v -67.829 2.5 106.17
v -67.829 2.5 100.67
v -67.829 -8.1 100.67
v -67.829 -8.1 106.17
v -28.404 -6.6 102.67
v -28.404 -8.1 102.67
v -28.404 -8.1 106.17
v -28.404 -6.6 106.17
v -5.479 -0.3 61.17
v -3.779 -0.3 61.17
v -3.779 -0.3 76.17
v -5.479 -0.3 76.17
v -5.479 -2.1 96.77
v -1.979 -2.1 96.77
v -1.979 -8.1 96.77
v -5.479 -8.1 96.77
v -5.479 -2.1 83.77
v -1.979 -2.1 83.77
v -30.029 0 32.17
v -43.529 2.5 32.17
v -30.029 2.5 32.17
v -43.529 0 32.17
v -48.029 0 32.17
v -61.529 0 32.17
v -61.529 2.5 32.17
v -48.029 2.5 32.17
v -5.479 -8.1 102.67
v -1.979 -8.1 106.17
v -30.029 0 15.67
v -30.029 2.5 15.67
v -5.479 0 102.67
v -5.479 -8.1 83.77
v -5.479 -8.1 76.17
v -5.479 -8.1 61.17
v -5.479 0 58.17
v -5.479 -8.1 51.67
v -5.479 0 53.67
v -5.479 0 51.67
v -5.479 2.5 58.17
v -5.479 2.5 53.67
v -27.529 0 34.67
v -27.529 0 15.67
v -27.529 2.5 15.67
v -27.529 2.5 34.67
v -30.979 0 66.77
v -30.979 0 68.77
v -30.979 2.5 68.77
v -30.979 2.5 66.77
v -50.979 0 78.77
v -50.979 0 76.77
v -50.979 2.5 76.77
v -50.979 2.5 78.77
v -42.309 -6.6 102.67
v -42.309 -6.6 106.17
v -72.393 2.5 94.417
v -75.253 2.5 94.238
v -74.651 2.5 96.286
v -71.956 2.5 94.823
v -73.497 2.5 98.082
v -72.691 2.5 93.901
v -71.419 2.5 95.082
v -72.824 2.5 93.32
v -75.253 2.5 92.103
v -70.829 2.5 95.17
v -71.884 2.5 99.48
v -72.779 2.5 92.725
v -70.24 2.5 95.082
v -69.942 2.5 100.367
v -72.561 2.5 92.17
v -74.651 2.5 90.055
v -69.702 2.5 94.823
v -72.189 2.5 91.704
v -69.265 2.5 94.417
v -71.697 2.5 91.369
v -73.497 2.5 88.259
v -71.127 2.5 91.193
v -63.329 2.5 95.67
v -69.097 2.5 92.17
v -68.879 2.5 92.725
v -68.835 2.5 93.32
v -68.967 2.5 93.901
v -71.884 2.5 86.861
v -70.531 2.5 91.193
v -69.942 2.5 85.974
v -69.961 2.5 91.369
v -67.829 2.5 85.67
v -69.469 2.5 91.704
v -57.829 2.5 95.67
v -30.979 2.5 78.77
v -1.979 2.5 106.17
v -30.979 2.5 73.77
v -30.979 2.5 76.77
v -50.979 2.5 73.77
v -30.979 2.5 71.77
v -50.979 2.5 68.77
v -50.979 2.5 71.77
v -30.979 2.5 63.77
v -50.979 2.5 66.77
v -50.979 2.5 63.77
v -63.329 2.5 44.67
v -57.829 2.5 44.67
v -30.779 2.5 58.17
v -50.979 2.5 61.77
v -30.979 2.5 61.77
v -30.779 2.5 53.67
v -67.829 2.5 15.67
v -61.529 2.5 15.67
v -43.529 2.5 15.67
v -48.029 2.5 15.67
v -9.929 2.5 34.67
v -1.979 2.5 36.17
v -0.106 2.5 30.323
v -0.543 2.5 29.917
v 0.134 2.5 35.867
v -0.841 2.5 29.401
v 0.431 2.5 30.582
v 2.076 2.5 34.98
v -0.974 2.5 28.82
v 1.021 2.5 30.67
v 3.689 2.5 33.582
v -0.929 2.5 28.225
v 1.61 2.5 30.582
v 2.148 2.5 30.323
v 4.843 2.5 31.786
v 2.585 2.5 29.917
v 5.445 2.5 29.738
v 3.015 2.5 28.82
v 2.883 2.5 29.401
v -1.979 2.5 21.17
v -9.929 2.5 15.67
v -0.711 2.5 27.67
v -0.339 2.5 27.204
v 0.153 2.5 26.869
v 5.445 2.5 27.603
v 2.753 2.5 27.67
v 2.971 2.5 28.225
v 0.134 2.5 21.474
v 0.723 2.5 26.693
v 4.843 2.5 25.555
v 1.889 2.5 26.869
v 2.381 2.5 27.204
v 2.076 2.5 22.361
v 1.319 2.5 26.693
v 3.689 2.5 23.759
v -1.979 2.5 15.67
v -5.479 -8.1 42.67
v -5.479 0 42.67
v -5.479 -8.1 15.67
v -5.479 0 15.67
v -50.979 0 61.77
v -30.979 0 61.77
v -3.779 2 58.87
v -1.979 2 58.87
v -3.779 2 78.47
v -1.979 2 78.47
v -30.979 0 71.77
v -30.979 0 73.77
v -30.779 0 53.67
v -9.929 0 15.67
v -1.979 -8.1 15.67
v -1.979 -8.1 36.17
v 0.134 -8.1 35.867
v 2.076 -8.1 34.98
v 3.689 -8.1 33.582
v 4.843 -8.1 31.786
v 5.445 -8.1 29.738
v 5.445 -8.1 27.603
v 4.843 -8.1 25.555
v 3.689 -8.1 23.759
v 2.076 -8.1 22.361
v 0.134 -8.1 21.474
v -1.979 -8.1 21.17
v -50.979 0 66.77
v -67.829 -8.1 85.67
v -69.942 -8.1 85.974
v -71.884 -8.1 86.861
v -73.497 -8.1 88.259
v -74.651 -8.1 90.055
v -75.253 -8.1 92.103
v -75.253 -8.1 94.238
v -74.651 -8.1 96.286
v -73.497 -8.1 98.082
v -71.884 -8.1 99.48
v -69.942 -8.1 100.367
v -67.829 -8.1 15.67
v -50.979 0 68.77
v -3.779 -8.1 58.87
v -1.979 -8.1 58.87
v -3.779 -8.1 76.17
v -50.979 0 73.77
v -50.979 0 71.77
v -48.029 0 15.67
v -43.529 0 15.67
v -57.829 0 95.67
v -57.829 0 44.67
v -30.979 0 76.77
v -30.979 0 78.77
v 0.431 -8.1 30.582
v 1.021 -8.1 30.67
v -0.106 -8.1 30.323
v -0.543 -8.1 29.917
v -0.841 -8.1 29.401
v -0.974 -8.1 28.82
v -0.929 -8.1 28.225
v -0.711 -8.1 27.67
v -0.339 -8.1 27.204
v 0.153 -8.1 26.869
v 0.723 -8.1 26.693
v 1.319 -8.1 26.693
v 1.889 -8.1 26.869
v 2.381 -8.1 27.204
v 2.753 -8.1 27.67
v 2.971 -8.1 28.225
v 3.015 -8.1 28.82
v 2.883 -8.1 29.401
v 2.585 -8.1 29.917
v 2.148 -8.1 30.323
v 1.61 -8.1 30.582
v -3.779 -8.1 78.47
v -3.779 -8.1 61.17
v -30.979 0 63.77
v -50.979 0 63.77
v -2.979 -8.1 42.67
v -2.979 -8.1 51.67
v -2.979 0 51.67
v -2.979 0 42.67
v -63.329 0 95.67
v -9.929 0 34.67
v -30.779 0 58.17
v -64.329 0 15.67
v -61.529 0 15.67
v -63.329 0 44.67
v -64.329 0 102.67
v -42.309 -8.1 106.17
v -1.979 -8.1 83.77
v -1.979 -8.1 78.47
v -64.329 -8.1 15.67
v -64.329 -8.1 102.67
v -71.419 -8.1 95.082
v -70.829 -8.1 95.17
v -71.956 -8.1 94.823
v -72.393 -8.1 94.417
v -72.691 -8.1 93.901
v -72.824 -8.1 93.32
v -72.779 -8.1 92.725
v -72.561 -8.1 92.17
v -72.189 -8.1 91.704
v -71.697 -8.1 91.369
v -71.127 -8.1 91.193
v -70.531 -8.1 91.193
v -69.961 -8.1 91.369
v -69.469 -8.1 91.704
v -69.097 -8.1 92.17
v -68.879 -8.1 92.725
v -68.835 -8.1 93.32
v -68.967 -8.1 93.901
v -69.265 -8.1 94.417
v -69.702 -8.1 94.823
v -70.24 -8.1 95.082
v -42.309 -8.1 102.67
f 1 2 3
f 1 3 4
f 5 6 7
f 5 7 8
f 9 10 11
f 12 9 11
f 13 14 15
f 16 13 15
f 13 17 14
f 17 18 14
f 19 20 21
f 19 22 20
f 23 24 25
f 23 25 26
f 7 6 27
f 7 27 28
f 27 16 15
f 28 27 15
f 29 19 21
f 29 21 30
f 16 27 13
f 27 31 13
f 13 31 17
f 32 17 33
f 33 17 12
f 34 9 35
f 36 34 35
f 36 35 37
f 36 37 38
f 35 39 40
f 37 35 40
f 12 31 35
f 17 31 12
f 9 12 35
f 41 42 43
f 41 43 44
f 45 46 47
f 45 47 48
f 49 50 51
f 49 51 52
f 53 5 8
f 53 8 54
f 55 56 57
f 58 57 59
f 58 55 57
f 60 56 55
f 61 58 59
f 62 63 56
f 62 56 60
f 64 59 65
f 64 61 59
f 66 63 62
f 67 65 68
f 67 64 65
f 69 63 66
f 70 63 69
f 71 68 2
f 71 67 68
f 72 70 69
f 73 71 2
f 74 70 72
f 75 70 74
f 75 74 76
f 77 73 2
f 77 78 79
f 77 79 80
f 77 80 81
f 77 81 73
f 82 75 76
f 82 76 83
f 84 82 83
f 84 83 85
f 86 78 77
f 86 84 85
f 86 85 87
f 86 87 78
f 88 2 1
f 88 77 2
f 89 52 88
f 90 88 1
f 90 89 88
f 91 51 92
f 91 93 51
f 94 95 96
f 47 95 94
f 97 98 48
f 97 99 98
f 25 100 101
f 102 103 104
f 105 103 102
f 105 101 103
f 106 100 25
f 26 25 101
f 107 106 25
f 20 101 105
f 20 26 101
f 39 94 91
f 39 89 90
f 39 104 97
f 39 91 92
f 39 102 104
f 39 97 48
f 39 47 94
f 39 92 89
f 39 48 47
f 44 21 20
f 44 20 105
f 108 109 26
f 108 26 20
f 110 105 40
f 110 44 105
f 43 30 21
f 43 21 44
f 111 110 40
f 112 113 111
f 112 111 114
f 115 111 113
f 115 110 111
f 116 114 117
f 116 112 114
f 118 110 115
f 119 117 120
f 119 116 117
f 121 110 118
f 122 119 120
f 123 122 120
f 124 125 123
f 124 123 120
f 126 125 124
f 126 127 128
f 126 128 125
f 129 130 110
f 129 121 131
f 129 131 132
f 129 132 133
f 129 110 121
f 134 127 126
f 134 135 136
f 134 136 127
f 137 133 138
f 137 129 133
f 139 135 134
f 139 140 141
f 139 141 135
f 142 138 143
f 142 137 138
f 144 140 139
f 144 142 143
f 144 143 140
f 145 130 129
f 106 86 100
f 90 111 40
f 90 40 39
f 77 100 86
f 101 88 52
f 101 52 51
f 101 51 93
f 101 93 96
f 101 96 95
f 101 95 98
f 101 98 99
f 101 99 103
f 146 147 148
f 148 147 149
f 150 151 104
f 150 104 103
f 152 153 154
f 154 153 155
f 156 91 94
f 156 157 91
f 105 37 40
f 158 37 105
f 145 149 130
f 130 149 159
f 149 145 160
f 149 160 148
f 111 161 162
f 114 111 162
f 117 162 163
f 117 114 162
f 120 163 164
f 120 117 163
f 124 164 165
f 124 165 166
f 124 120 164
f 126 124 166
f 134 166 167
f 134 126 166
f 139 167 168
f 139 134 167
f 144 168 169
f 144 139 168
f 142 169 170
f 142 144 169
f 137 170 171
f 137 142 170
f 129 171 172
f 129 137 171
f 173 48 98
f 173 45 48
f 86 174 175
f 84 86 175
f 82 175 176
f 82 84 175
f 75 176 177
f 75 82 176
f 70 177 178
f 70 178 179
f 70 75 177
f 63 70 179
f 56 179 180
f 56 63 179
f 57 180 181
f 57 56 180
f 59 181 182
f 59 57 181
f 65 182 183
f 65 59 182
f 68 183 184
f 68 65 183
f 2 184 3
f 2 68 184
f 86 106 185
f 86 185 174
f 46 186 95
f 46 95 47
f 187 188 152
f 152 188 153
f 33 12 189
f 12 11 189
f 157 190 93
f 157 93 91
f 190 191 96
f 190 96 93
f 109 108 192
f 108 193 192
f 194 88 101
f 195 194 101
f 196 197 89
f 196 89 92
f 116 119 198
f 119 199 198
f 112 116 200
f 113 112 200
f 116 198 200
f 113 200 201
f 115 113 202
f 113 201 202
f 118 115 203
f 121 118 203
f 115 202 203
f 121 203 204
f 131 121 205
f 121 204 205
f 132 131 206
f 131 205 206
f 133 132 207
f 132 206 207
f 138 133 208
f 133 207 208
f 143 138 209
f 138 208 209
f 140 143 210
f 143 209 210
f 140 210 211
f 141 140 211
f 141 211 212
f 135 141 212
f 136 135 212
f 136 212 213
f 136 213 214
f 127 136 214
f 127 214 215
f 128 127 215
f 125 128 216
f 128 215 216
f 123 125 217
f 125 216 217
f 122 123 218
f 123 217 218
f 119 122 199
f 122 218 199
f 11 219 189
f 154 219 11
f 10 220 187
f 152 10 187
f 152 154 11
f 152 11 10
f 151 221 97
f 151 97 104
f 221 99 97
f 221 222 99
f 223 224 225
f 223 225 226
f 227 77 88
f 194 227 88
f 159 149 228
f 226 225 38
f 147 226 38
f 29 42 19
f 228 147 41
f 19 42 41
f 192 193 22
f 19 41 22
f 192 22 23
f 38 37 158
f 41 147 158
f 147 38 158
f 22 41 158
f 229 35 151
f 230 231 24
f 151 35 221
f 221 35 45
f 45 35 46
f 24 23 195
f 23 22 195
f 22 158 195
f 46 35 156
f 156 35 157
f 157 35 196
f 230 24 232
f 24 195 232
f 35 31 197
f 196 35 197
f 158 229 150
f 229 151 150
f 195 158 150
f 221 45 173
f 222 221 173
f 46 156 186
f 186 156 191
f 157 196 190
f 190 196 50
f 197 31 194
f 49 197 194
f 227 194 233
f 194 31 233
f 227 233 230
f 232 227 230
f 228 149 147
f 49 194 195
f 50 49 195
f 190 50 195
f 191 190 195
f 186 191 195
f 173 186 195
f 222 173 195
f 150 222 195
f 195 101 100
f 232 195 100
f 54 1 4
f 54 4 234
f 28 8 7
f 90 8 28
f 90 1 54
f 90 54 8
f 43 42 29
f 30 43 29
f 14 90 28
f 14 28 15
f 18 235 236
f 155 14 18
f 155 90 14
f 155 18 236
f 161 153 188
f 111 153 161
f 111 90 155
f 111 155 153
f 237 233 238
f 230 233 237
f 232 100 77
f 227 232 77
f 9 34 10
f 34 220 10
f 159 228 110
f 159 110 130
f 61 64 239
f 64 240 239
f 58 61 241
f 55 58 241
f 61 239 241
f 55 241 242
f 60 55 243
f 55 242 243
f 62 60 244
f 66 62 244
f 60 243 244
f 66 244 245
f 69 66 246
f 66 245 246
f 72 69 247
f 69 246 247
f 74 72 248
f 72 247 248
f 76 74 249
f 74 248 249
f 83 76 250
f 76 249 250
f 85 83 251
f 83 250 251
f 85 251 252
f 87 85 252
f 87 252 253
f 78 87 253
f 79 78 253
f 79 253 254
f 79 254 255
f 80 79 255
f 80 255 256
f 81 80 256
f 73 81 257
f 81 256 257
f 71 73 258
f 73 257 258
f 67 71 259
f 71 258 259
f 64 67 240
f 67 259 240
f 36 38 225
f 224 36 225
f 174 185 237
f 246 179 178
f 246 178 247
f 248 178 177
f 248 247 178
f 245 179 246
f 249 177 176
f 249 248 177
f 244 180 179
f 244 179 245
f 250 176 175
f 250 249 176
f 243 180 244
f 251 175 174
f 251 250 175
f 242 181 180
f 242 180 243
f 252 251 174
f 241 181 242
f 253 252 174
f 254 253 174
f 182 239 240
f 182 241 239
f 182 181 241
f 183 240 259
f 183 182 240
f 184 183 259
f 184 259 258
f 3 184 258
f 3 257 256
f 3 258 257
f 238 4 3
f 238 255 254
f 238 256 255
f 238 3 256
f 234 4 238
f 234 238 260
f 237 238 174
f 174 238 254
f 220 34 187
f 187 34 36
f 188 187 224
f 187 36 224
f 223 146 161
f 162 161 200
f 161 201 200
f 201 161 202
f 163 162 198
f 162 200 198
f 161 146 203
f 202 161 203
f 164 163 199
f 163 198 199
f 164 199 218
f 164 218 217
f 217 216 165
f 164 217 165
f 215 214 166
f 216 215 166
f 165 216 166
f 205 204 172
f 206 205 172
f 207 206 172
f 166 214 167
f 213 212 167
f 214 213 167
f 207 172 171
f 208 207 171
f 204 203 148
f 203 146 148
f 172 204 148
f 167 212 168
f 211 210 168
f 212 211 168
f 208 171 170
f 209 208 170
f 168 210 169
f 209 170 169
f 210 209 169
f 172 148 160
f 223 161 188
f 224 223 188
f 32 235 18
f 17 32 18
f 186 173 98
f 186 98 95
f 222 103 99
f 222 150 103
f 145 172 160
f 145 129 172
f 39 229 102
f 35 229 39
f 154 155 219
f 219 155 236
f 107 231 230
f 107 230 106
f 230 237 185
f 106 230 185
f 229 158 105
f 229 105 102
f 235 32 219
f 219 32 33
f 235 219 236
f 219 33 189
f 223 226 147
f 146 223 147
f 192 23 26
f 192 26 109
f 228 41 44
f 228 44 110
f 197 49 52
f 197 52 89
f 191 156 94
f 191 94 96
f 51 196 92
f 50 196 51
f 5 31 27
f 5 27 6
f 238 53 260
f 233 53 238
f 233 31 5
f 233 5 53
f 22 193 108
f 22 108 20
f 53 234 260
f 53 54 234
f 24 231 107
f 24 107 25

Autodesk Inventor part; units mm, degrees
ref_plane "YZ Plane" through (0, 0, 0) normal (1, 0, 0) x (0, 1, 0)
ref_plane "XZ Plane" through (0, 0, 0) normal (0, 1, 0) x (-1, 0, 0)
ref_plane "XY Plane" through (0, 0, 0) normal (0, 0, 1) x (1, 0, 0)
sketch "Skizze1" plane through (0, 0, 0) normal (0, 1, 0) x (-1, 0, 0)
  line L0 (64.3291, 15.6705) -> (64.3291, 102.6705)
  line L1 (64.3291, 102.6705) -> (5.4791, 102.6705)
  line L2 (61.5291, 32.1705) -> (48.0291, 32.1705)
  line L3 (48.0291, 32.1705) -> (48.0291, 15.6705)
  line L4 (61.5291, 15.6705) -> (61.5291, 32.1705)
  line L5 (43.5291, 32.1705) -> (30.0291, 32.1705)
  line L6 (30.0291, 32.1705) -> (30.0291, 15.6705)
  line L7 (30.0291, 15.6705) -> (30.7791, 15.6705)
  line L8 (43.5291, 15.6705) -> (43.5291, 32.1705)
  line L9 (27.5291, 34.6705) -> (9.9291, 34.6705)
  line L10 (9.9291, 34.6705) -> (9.9291, 15.6705)
  line L11 (27.5291, 15.6705) -> (27.5291, 34.6705)
  line L12 (30.7791, 58.1705) -> (5.4791, 58.1705)
  line L13 (5.4791, 53.6705) -> (30.7791, 53.6705)
  line L14 (30.7791, 53.6705) -> (30.7791, 58.1705)
  line L15 (5.4791, 102.6705) -> (5.4791, 58.1705)
  line L16 (5.4791, 53.6705) -> (5.4791, 15.6705)
  line L17 (43.5291, 15.6705) -> (48.0291, 15.6705)
  line L18 (61.5291, 15.6705) -> (64.3291, 15.6705)
  line L19 (50.9791, 78.7705) -> (30.9791, 78.7705)
  line L20 (30.9791, 78.7705) -> (30.9791, 76.7705)
  line L21 (30.9791, 76.7705) -> (50.9791, 76.7705)
  line L22 (50.9791, 76.7705) -> (50.9791, 78.7705)
  line L23 (50.9791, 73.7705) -> (30.9791, 73.7705)
  line L24 (30.9791, 73.7705) -> (30.9791, 71.7705)
  line L25 (30.9791, 71.7705) -> (50.9791, 71.7705)
  line L26 (50.9791, 71.7705) -> (50.9791, 73.7705)
  line L27 (50.9791, 68.7705) -> (30.9791, 68.7705)
  line L28 (30.9791, 68.7705) -> (30.9791, 66.7705)
  line L29 (30.9791, 66.7705) -> (50.9791, 66.7705)
  line L30 (50.9791, 66.7705) -> (50.9791, 68.7705)
  line L31 (50.9791, 63.7705) -> (30.9791, 63.7705)
  line L32 (30.9791, 63.7705) -> (30.9791, 61.7705)
  line L33 (30.9791, 61.7705) -> (50.9791, 61.7705)
  line L34 (50.9791, 61.7705) -> (50.9791, 63.7705)
  line L35 (5.4791, 15.6705) -> (9.9291, 15.6705)
  line L36 (27.5291, 15.6705) -> (30.0291, 15.6705)
  line L37 (5.4791, 58.1705) -> (5.4791, 63.7705)
  line L38 (62.9791, 94.6705) -> (57.4791, 94.6705)
  line L39 (57.4791, 94.6705) -> (57.4791, 41.6705)
  line L40 (57.4791, 41.6705) -> (62.9791, 41.6705)
  line L41 (62.9791, 41.6705) -> (62.9791, 94.6705)
  dimension "d2" = 13.5
  dimension "d3" = 13.5
  dimension "d45" = 2.8
  dimension "d46" = 4.5
  dimension "d47" = 2.5
  dimension "d49" = 42.5
  dimension "d51" = 49
  dimension "d60" = 53
  dimension "d61" = 8
  dimension "d62" = 5.5
  dimension "d63" = 1.35
  dimension "d70" = 87
  dimension "d71" = 87
  dimension "d107" = 4.45
  dimension "d108" = 38
  dimension "d110" = 17.6
  dimension "d141" = 25.3
  dimension "d142" = 19
sketch "Skizze2" plane through (0, 0, 0) normal (0, 1, 0) x (-1, 0, 0)
  point P0 (0, 0)
extrude "Extrusion1" add sketch "Skizze1" along normal blind 3.5 contours L18 L4 L2 L3 L17 L8 L5 L6 L36 L11 L9 L10 L35 L16 L13 L14 L12 L15 L1 L0 | L41 L40 L39 L38
sketch "Skizze3" plane through (0, 0, 0) normal (0, -1, 0) x (1, 0, 0)
  line L0 (-9.9291, 15.6705) -> (-5.4791, 15.6705) projected
  line L1 (-64.3291, 102.6705) -> (-5.4791, 102.6705) projected
  line L2 (-5.4791, 15.6705) -> (-5.4791, 102.6705)
  line L3 (-5.4791, 102.6705) -> (-64.3291, 102.6705)
  line L4 (-64.3291, 102.6705) -> (-64.3291, 15.6705)
  point P0 (0, 0)
sketch "Skizze4" plane through (0, 0, 0) normal (0, -1, 0) x (1, 0, 0)
  line L0 (-30.7791, 53.6705) -> (-5.4791, 53.6705) projected
  line L1 (-5.4791, 53.6705) -> (-5.4791, 15.6705) projected
  line L2 (-5.4791, 15.6705) -> (-5.4791, 102.6705)
  line L3 (-64.3291, 102.6705) -> (-5.4791, 102.6705) projected
  line L4 (-5.4791, 102.6705) -> (-64.3291, 102.6705)
  line L5 (-61.5291, 15.6705) -> (-64.3291, 15.6705) projected
  line L6 (-64.3291, 102.6705) -> (-64.3291, 15.6705)
  point P0 (0, 0)
  point P1 (-5.4791, 68.3705)
  point P2 (-5.4791, 63.3705)
sketch "Skizze5" plane through (0, 3.5, 0) normal (0, 1, 0) x (1, 0, 0)
  point P0 (0, 0)
sketch "Skizze6" plane through (0, 3.5, 0) normal (0, 1, 0) x (1, 0, 0)
  point P0 (0, 0)
sketch "Skizze7" plane through (0, 3.5, 0) normal (0, 1, 0) x (1, 0, 0)
  point P0 (0, 0)
sketch "Skizze8" plane through (0, 3.5, 0) normal (0, 1, 0) x (1, 0, 0)
  point P0 (0, 0)
sketch "Skizze9" plane through (0, 3.5, 0) normal (0, 1, 0) x (1, 0, 0)
  point P0 (0, 0)
sketch "Skizze10" plane through (0, 3.5, 0) normal (0, 1, 0) x (1, 0, 0)
  line L0 (-57.8291, -44.6705) -> (-63.3291, -44.6705)
  line L1 (-63.3291, -44.6705) -> (-63.3291, -95.6705)
  line L2 (-63.3291, -95.6705) -> (-57.8291, -95.6705)
  line L3 (-57.8291, -95.6705) -> (-57.8291, -44.6705)
  line L4 (-64.3291, -102.6705) -> (-5.4791, -102.6705) projected
  line L5 (-64.3291, -15.6705) -> (-64.3291, -102.6705) projected
  point P0 (0, 0)
  dimension "d64" = 51
  dimension "d65" = 5.5
  dimension "d66" = 7
  dimension "d67" = 1
extrude "Extrusion2" cut sketch "Skizze10" against normal through all
sketch "Skizze11" plane through (0, 3.5, 0) normal (0, 1, 0) x (1, 0, 0)
  line L0 (-64.3291, -102.6705) -> (-64.3291, -15.6705) projected
  line L1 (-64.3291, -15.6705) -> (-64.3291, -102.6705) projected
  line L2 (-64.3291, -15.6705) -> (-67.8291, -15.6705)
  line L3 (-67.8291, -15.6705) -> (-67.8291, -106.1705)
  line L4 (-67.8291, -106.1705) -> (-1.9791, -106.1705)
  line L5 (-1.9791, -106.1705) -> (-1.9791, -15.6705)
  line L6 (-1.9791, -15.6705) -> (-5.4791, -15.6705)
  line L7 (-64.3291, -102.6705) -> (-5.4791, -102.6705) projected
  line L8 (-5.4791, -102.6705) -> (-64.3291, -102.6705)
  line L9 (-64.3291, -102.6705) -> (-64.3291, -15.6705)
  line L10 (-64.3291, -15.6705) -> (-64.3291, -102.6705)
  line L11 (-5.4791, -53.6705) -> (-5.4791, -15.6705) projected
  line L12 (-5.4791, -102.6705) -> (-5.4791, -15.6705)
  line L13 (-5.4791, -15.6705) -> (-1.9791, -15.6705)
  point P0 (0, 0)
  dimension "d77" = 3.5
  dimension "d78" = 3.5
  dimension "d79" = 3.5
sketch "Skizze12" plane through (0, 0, 0) normal (0, -1, 0) x (1, 0, 0)
  line L0 (-5.4791, 15.6705) -> (-9.9291, 15.6705) projected
  line L1 (-5.4791, 102.6705) -> (-5.4791, 58.1705) projected
  line L2 (-5.4791, 15.6705) -> (-5.4791, 102.6705)
  line L3 (-5.4791, 102.6705) -> (-64.3291, 102.6705)
  line L4 (-64.3291, 102.6705) -> (-64.3291, 15.6705)
  point P0 (0, 0)
extrude "Extrusion3" add sketch "Skizze11" against normal blind 11.6
sketch "Skizze13" plane through (0, 3.5, 0) normal (0, 1, 0) x (1, 0, 0)
  line L0 (-67.8291, -15.6705) -> (-67.8291, -106.1705) projected
  arc A0 (-67.8291, -85.6705) -> (-67.8291, -100.6705) centre (-67.8291, -93.1705) ccw
  arc A1 (-67.8291, -21.1705) -> (-67.8291, -36.1705) centre (-67.8291, -28.6705) ccw
  arc A2 (-1.9791, -36.1705) -> (-1.9791, -21.1705) centre (-1.9791, -28.6705) ccw
  arc A3 (-1.9791, -100.6705) -> (-1.9791, -85.6705) centre (-1.9791, -93.1705) ccw
  line L1 (-67.8291, -106.1705) -> (-1.9791, -106.1705) projected
  line L2 (-1.9791, -15.6705) -> (-9.9291, -15.6705) projected
  line L3 (-1.9791, -106.1705) -> (-1.9791, -15.6705) projected
  point P0 (0, 0)
  dimension "d82" = 15
  dimension "d83" = 15
  dimension "d84" = 15
  dimension "d85" = 15
  dimension "d86" = 13
  dimension "d87" = 13
  dimension "d88" = 13
  dimension "d89" = 13
extrude "Extrusion4" add sketch "Skizze13" against normal blind 11.6
sketch "Skizze14" plane through (0, 3.5, 0) normal (0, 1, 0) x (1, 0, 0)
  arc A0 (-1.9791, -36.1705) -> (-1.9791, -21.1705) centre (-1.9791, -28.6705) ccw projected
  arc A1 (-1.9791, -100.6705) -> (-1.9791, -85.6705) centre (-1.9791, -93.1705) ccw projected
  arc A2 (-67.8291, -85.6705) -> (-67.8291, -100.6705) centre (-67.8291, -93.1705) ccw projected
  arc A3 (-67.8291, -21.1705) -> (-67.8291, -36.1705) centre (-67.8291, -28.6705) ccw projected
  point P0 (0, 0)
  point P1 (-70.8291, -93.1705)
  point P2 (-70.8291, -28.6705)
  point P3 (1.0209, -93.1705)
  point P4 (1.0209, -28.6705)
  dimension "d92" = 0
  dimension "d93" = 3
  dimension "d94" = 0
  dimension "d95" = 3
  dimension "d96" = 0
  dimension "d97" = 3
  dimension "d98" = 0
  dimension "d99" = 3
hole "Bohrung1" at (-70.8291, 3.5, 28.6705) at (1.0209, 3.5, 28.6705) at (1.0209, 3.5, 93.1705) at (-70.8291, 3.5, 93.1705) direction (0, -1, 0) diameter 4 end through all
sketch "Skizze15" plane through (0, 3.5, 0) normal (0, 1, 0) x (1, 0, 0)
  point P0 (0, 0)
sketch "Skizze16" plane through (0, 3.5, 0) normal (0, 1, 0) x (1, 0, 0)
  point P0 (0, 0)
sketch "Skizze17" plane through (-9.9291, 0, 15.6705) normal (0, 0, -1) x (-1, 0, 0)
  point P0 (-9.9291, 0)
sketch "Skizze18" plane through (0, 3.5, 0) normal (0, 1, 0) x (1, 0, 0)
  line L0 (-1.9791, -106.1705) -> (-1.9791, -100.6705) projected
  line L1 (-1.9791, -103.4205) -> (11.4811, -103.4205)
  line L2 (11.4811, -103.4205) -> (11.4811, -74.2753)
  line L3 (11.4811, -74.2753) -> (-1.9791, -74.2753)
  line L4 (-1.9791, -74.2753) -> (-1.9791, -103.4205)
  line L5 (-67.8291, -36.1705) -> (-67.8291, -85.6705) projected
  line L6 (-67.8291, -38.1575) -> (-77.5027, -38.1575)
  line L7 (-77.5027, -38.1575) -> (-77.5027, -17.1859)
  line L8 (-77.5027, -17.1859) -> (-67.8291, -17.1859)
  line L9 (-67.8291, -17.1859) -> (-67.8291, -38.1575)
  point P0 (0, 0)
extrude "Extrusion5" cut sketch "Skizze18" against normal blind 20
sketch "Skizze19" plane through (0, 3.5, 0) normal (0, 1, 0) x (1, 0, 0)
  point P0 (0, 0)
sketch "Skizze20" plane through (-67.8291, 3.5, 106.1705) normal (0, 0, 1) x (1, 0, 0)
  point P0 (67.8291, -3.5)
sketch "Skizze21" plane through (-67.8291, 3.5, 106.1705) normal (0, 0, 1) x (1, 0, 0)
  line L0 (65.85, -11.6) -> (0, -11.6) projected
  line L1 (26.425, -11.6) -> (39.425, -11.6)
  line L2 (39.425, -11.6) -> (39.425, -10.1)
  line L3 (39.425, -10.1) -> (26.425, -10.1)
  line L4 (26.425, -10.1) -> (26.425, -11.6)
  line L5 (65.85, 0) -> (65.85, -11.6) projected
  point P0 (67.8291, -3.5)
  dimension "d113" = 13
  dimension "d114" = 1.5
  dimension "d115" = 26.425
extrude "Extrusion6" cut sketch "Skizze21" along normal mid plane 20
sketch "Skizze22" plane through (0, 3.5, 0) normal (0, 1, 0) x (1, 0, 0)
  point P0 (0, 0)
sketch "Skizze23" plane through (0, 3.5, 0) normal (0, 1, 0) x (1, 0, 0)
  point P0 (0, 0)
sketch "Skizze24" plane through (-1.9791, -8.1, 106.1705) normal (1, 0, 0) x (0, 0, -1)
  line L0 (5.5, 0) -> (20.5, 0) projected
  line L1 (7.3789, 0) -> (15, 0)
  line L2 (90.5, 0) -> (3.5, 0) projected
  line L3 (30, 0) -> (45, 0)
  line L4 (45, 0) -> (45, 7.8)
  line L5 (45, 7.8) -> (30, 7.8)
  line L6 (30, 7.8) -> (30, 0)
  line L7 (9.4, 0) -> (22.4, 0)
  line L8 (22.4, 0) -> (22.4, 6)
  line L9 (22.4, 6) -> (9.4, 6)
  line L10 (9.4, 6) -> (9.4, 0)
  line L11 (0, 11.6) -> (0, 0) projected
  point P0 (106.1705, 8.1)
  point P1 (15.9, 6)
  dimension "d118" = 15
  dimension "d119" = 13
  dimension "d120" = 6
  dimension "d121" = 15.9
  dimension "d122" = 7.8
  dimension "d123" = 45
sketch "Skizze25" plane through (0, -8.1, 0) normal (0, -1, 0) x (1, 0, 0)
  point P0 (0, 0)
extrude "Extrusion7" cut sketch "Skizze24" against normal blind 20
sketch "Skizze26" plane through (-1.9791, -8.1, 106.1705) normal (1, 0, 0) x (0, 0, -1)
  line L0 (20.5, 0) -> (90.5, 0) projected
  line L1 (44.8289, 0) -> (47.7248, 0)
  point P0 (106.1705, 8.1)
sketch "Skizze27" plane through (-1.9791, -8.1, 106.1705) normal (1, 0, 0) x (0, 0, -1)
  line L0 (20.5, 0) -> (90.5, 0) projected
  line L1 (45.0921, 0) -> (47.3, 0)
  line L2 (47.3, 0) -> (47.3, 10.1)
  line L3 (10.5, 8.1) -> (61.5, 8.1) projected
  line L4 (47.3, 10.1) -> (27.7, 10.1)
  line L5 (27.7, 10.1) -> (27.7, 0)
  line L6 (27.7, 0) -> (30, 0)
  line L7 (30, 0) -> (30, 7.8) projected
  line L8 (30, 0) -> (30, 7.8)
  line L9 (45, 7.8) -> (45, 0) projected
  line L10 (30, 7.8) -> (45, 7.8)
  line L11 (45, 7.8) -> (45, 0)
  line L12 (45, 0) -> (47.3, 0)
  line L13 (70, 0) -> (70, 11.6) projected
  point P0 (106.1705, 8.1)
  dimension "d126" = 2.3
  dimension "d127" = 2.3
  dimension "d128" = 2.3
extrude "Extrusion8" cut sketch "Skizze27" against normal blind 1.8 contours L5 L3 L2 L0 L9 L10 L7 | L5 L4 L2 L3
sketch "Skizze28" plane through (-1.9791, -8.1, 106.1705) normal (1, 0, 0) x (0, 0, -1)
  point P0 (106.1705, 8.1)
sketch "Skizze29" plane through (0, -8.1, 0) normal (0, -1, 0) x (1, 0, 0)
  point P0 (0, 0)
sketch "Skizze30" plane through (0, 3.5, 0) normal (0, 1, 0) x (1, 0, 0)
  point P0 (0, 0)
sketch "Skizze31" plane through (0, -8.1, 0) normal (0, -1, 0) x (1, 0, 0)
  line L0 (-5.4791, 15.6705) -> (-5.4791, 53.6705) projected
  line L1 (-5.4791, 51.6705) -> (-2.9791, 51.6705)
  line L2 (-2.9791, 51.6705) -> (-2.9791, 42.6705)
  line L3 (-2.9791, 42.6705) -> (-5.4791, 42.6705)
  line L4 (-5.4791, 15.6705) -> (-1.9791, 15.6705) projected
  point P0 (0, 0)
  dimension "d131" = 36
  dimension "d132" = 27
  dimension "d133" = 2.5
sketch "Skizze32" plane through (-5.4791, 3.5, 53.6705) normal (-1, 0, 0) x (0, 0, 1)
  point P0 (-53.6705, -3.5)
extrude "Extrusion9" cut sketch "Skizze31" against normal blind 8.1
sketch "Skizze33" plane through (0, -8.1, 0) normal (0, -1, 0) x (1, 0, 0)
  line L0 (-67.8291, 106.1705) -> (-1.9791, 106.1705) projected
  line L1 (-41.3093, 106.1705) -> (-45.3093, 106.1705)
  line L2 (-45.3093, 106.1705) -> (-45.3093, 102.6705)
  line L3 (-5.4791, 102.6705) -> (-64.3291, 102.6705) projected
  line L4 (-41.3093, 102.6705) -> (-41.3093, 106.1705)
  point P0 (0, 0)
sketch "Skizze34" plane through (-41.4041, -8.1, 106.1705) normal (1, 0, 0) x (0, 0, -1)
  point P0 (106.1705, 8.1)
extrude "Extrusion10" cut sketch "Skizze33" against normal blind 1.5
sketch "Skizze35" plane through (0, 3.5, 0) normal (0, 1, 0) x (1, 0, 0)
  point P0 (0, 0)
sketch "Skizze36" plane through (0, 3.5, 0) normal (0, 1, 0) x (1, 0, 0)
  point P0 (0, 0)
sketch "Skizze37" plane through (-9.9291, 0, 34.6705) normal (0, 0, -1) x (-1, 0, 0)
  point P0 (-9.9291, 0)
sketch "Skizze38" plane through (0, 3.5, 0) normal (0, 1, 0) x (1, 0, 0)
  line L0 (-78.4732, -10.8186) -> (12.9519, -10.8186)
  line L1 (12.9519, -10.8186) -> (12.9519, -110.1672)
  line L2 (12.9519, -110.1672) -> (-78.4732, -110.1672)
  line L3 (-78.4732, -110.1672) -> (-78.4732, -10.8186)
  point P0 (0, 0)
extrude "Extrusion11" cut sketch "Skizze38" against normal blind 1
sketch "Skizze39" plane through (0, -8.1, 0) normal (0, -1, 0) x (1, 0, 0)
  point P0 (0, 0)
sketch "Skizze40" plane through (-28.4041, -8.1, 106.1705) normal (0, 0, 1) x (1, 0, 0)
  point P0 (28.4041, 8.1)
sketch "Skizze41" plane through (0, 2.5, 0) normal (0, 1, 0) x (1, 0, 0)
  point P0 (0, 0)
sketch "Skizze42" plane through (0, 2.5, 0) normal (0, 1, 0) x (1, 0, 0)
  point P0 (0, 0)
sketch "Skizze43" plane through (-30.0291, 0, 32.1705) normal (0, 0, -1) x (-1, 0, 0)
  point P0 (-30.0291, 0)
sketch "Skizze44" plane through (-9.9291, 0, 34.6705) normal (0, 0, -1) x (-1, 0, 0)
  point P0 (-9.9291, 0)
sketch "Skizze45" plane through (0, 2.5, 0) normal (0, 1, 0) x (1, 0, 0)
  point P0 (0, 0)
sketch "Skizze46" plane through (-28.4041, -6.6, 102.6705) normal (0, -1, 0) x (1, 0, 0)
  line L0 (0, 0) -> (-16.9052, 0) projected
  line L1 (-16.9052, 0) -> (-16.9052, 3.5) projected
  line L2 (-16.9052, 3.5) -> (0, 3.5) projected
  line L3 (-16.9052, 3.5) -> (-13.9052, 3.5)
  line L4 (-13.9052, 3.5) -> (-13.9052, 0)
  line L5 (-13.9052, 0) -> (-16.9052, 0)
  line L6 (-16.9052, 0) -> (-16.9052, 3.5)
  point P0 (28.4041, -102.6705)
  dimension "d143" = 3
  dimension "d144" = 3.5
extrude "Extrusion12" add sketch "Skizze46" along normal blind 1.5
properties part number "Oberteil_fertig2"
